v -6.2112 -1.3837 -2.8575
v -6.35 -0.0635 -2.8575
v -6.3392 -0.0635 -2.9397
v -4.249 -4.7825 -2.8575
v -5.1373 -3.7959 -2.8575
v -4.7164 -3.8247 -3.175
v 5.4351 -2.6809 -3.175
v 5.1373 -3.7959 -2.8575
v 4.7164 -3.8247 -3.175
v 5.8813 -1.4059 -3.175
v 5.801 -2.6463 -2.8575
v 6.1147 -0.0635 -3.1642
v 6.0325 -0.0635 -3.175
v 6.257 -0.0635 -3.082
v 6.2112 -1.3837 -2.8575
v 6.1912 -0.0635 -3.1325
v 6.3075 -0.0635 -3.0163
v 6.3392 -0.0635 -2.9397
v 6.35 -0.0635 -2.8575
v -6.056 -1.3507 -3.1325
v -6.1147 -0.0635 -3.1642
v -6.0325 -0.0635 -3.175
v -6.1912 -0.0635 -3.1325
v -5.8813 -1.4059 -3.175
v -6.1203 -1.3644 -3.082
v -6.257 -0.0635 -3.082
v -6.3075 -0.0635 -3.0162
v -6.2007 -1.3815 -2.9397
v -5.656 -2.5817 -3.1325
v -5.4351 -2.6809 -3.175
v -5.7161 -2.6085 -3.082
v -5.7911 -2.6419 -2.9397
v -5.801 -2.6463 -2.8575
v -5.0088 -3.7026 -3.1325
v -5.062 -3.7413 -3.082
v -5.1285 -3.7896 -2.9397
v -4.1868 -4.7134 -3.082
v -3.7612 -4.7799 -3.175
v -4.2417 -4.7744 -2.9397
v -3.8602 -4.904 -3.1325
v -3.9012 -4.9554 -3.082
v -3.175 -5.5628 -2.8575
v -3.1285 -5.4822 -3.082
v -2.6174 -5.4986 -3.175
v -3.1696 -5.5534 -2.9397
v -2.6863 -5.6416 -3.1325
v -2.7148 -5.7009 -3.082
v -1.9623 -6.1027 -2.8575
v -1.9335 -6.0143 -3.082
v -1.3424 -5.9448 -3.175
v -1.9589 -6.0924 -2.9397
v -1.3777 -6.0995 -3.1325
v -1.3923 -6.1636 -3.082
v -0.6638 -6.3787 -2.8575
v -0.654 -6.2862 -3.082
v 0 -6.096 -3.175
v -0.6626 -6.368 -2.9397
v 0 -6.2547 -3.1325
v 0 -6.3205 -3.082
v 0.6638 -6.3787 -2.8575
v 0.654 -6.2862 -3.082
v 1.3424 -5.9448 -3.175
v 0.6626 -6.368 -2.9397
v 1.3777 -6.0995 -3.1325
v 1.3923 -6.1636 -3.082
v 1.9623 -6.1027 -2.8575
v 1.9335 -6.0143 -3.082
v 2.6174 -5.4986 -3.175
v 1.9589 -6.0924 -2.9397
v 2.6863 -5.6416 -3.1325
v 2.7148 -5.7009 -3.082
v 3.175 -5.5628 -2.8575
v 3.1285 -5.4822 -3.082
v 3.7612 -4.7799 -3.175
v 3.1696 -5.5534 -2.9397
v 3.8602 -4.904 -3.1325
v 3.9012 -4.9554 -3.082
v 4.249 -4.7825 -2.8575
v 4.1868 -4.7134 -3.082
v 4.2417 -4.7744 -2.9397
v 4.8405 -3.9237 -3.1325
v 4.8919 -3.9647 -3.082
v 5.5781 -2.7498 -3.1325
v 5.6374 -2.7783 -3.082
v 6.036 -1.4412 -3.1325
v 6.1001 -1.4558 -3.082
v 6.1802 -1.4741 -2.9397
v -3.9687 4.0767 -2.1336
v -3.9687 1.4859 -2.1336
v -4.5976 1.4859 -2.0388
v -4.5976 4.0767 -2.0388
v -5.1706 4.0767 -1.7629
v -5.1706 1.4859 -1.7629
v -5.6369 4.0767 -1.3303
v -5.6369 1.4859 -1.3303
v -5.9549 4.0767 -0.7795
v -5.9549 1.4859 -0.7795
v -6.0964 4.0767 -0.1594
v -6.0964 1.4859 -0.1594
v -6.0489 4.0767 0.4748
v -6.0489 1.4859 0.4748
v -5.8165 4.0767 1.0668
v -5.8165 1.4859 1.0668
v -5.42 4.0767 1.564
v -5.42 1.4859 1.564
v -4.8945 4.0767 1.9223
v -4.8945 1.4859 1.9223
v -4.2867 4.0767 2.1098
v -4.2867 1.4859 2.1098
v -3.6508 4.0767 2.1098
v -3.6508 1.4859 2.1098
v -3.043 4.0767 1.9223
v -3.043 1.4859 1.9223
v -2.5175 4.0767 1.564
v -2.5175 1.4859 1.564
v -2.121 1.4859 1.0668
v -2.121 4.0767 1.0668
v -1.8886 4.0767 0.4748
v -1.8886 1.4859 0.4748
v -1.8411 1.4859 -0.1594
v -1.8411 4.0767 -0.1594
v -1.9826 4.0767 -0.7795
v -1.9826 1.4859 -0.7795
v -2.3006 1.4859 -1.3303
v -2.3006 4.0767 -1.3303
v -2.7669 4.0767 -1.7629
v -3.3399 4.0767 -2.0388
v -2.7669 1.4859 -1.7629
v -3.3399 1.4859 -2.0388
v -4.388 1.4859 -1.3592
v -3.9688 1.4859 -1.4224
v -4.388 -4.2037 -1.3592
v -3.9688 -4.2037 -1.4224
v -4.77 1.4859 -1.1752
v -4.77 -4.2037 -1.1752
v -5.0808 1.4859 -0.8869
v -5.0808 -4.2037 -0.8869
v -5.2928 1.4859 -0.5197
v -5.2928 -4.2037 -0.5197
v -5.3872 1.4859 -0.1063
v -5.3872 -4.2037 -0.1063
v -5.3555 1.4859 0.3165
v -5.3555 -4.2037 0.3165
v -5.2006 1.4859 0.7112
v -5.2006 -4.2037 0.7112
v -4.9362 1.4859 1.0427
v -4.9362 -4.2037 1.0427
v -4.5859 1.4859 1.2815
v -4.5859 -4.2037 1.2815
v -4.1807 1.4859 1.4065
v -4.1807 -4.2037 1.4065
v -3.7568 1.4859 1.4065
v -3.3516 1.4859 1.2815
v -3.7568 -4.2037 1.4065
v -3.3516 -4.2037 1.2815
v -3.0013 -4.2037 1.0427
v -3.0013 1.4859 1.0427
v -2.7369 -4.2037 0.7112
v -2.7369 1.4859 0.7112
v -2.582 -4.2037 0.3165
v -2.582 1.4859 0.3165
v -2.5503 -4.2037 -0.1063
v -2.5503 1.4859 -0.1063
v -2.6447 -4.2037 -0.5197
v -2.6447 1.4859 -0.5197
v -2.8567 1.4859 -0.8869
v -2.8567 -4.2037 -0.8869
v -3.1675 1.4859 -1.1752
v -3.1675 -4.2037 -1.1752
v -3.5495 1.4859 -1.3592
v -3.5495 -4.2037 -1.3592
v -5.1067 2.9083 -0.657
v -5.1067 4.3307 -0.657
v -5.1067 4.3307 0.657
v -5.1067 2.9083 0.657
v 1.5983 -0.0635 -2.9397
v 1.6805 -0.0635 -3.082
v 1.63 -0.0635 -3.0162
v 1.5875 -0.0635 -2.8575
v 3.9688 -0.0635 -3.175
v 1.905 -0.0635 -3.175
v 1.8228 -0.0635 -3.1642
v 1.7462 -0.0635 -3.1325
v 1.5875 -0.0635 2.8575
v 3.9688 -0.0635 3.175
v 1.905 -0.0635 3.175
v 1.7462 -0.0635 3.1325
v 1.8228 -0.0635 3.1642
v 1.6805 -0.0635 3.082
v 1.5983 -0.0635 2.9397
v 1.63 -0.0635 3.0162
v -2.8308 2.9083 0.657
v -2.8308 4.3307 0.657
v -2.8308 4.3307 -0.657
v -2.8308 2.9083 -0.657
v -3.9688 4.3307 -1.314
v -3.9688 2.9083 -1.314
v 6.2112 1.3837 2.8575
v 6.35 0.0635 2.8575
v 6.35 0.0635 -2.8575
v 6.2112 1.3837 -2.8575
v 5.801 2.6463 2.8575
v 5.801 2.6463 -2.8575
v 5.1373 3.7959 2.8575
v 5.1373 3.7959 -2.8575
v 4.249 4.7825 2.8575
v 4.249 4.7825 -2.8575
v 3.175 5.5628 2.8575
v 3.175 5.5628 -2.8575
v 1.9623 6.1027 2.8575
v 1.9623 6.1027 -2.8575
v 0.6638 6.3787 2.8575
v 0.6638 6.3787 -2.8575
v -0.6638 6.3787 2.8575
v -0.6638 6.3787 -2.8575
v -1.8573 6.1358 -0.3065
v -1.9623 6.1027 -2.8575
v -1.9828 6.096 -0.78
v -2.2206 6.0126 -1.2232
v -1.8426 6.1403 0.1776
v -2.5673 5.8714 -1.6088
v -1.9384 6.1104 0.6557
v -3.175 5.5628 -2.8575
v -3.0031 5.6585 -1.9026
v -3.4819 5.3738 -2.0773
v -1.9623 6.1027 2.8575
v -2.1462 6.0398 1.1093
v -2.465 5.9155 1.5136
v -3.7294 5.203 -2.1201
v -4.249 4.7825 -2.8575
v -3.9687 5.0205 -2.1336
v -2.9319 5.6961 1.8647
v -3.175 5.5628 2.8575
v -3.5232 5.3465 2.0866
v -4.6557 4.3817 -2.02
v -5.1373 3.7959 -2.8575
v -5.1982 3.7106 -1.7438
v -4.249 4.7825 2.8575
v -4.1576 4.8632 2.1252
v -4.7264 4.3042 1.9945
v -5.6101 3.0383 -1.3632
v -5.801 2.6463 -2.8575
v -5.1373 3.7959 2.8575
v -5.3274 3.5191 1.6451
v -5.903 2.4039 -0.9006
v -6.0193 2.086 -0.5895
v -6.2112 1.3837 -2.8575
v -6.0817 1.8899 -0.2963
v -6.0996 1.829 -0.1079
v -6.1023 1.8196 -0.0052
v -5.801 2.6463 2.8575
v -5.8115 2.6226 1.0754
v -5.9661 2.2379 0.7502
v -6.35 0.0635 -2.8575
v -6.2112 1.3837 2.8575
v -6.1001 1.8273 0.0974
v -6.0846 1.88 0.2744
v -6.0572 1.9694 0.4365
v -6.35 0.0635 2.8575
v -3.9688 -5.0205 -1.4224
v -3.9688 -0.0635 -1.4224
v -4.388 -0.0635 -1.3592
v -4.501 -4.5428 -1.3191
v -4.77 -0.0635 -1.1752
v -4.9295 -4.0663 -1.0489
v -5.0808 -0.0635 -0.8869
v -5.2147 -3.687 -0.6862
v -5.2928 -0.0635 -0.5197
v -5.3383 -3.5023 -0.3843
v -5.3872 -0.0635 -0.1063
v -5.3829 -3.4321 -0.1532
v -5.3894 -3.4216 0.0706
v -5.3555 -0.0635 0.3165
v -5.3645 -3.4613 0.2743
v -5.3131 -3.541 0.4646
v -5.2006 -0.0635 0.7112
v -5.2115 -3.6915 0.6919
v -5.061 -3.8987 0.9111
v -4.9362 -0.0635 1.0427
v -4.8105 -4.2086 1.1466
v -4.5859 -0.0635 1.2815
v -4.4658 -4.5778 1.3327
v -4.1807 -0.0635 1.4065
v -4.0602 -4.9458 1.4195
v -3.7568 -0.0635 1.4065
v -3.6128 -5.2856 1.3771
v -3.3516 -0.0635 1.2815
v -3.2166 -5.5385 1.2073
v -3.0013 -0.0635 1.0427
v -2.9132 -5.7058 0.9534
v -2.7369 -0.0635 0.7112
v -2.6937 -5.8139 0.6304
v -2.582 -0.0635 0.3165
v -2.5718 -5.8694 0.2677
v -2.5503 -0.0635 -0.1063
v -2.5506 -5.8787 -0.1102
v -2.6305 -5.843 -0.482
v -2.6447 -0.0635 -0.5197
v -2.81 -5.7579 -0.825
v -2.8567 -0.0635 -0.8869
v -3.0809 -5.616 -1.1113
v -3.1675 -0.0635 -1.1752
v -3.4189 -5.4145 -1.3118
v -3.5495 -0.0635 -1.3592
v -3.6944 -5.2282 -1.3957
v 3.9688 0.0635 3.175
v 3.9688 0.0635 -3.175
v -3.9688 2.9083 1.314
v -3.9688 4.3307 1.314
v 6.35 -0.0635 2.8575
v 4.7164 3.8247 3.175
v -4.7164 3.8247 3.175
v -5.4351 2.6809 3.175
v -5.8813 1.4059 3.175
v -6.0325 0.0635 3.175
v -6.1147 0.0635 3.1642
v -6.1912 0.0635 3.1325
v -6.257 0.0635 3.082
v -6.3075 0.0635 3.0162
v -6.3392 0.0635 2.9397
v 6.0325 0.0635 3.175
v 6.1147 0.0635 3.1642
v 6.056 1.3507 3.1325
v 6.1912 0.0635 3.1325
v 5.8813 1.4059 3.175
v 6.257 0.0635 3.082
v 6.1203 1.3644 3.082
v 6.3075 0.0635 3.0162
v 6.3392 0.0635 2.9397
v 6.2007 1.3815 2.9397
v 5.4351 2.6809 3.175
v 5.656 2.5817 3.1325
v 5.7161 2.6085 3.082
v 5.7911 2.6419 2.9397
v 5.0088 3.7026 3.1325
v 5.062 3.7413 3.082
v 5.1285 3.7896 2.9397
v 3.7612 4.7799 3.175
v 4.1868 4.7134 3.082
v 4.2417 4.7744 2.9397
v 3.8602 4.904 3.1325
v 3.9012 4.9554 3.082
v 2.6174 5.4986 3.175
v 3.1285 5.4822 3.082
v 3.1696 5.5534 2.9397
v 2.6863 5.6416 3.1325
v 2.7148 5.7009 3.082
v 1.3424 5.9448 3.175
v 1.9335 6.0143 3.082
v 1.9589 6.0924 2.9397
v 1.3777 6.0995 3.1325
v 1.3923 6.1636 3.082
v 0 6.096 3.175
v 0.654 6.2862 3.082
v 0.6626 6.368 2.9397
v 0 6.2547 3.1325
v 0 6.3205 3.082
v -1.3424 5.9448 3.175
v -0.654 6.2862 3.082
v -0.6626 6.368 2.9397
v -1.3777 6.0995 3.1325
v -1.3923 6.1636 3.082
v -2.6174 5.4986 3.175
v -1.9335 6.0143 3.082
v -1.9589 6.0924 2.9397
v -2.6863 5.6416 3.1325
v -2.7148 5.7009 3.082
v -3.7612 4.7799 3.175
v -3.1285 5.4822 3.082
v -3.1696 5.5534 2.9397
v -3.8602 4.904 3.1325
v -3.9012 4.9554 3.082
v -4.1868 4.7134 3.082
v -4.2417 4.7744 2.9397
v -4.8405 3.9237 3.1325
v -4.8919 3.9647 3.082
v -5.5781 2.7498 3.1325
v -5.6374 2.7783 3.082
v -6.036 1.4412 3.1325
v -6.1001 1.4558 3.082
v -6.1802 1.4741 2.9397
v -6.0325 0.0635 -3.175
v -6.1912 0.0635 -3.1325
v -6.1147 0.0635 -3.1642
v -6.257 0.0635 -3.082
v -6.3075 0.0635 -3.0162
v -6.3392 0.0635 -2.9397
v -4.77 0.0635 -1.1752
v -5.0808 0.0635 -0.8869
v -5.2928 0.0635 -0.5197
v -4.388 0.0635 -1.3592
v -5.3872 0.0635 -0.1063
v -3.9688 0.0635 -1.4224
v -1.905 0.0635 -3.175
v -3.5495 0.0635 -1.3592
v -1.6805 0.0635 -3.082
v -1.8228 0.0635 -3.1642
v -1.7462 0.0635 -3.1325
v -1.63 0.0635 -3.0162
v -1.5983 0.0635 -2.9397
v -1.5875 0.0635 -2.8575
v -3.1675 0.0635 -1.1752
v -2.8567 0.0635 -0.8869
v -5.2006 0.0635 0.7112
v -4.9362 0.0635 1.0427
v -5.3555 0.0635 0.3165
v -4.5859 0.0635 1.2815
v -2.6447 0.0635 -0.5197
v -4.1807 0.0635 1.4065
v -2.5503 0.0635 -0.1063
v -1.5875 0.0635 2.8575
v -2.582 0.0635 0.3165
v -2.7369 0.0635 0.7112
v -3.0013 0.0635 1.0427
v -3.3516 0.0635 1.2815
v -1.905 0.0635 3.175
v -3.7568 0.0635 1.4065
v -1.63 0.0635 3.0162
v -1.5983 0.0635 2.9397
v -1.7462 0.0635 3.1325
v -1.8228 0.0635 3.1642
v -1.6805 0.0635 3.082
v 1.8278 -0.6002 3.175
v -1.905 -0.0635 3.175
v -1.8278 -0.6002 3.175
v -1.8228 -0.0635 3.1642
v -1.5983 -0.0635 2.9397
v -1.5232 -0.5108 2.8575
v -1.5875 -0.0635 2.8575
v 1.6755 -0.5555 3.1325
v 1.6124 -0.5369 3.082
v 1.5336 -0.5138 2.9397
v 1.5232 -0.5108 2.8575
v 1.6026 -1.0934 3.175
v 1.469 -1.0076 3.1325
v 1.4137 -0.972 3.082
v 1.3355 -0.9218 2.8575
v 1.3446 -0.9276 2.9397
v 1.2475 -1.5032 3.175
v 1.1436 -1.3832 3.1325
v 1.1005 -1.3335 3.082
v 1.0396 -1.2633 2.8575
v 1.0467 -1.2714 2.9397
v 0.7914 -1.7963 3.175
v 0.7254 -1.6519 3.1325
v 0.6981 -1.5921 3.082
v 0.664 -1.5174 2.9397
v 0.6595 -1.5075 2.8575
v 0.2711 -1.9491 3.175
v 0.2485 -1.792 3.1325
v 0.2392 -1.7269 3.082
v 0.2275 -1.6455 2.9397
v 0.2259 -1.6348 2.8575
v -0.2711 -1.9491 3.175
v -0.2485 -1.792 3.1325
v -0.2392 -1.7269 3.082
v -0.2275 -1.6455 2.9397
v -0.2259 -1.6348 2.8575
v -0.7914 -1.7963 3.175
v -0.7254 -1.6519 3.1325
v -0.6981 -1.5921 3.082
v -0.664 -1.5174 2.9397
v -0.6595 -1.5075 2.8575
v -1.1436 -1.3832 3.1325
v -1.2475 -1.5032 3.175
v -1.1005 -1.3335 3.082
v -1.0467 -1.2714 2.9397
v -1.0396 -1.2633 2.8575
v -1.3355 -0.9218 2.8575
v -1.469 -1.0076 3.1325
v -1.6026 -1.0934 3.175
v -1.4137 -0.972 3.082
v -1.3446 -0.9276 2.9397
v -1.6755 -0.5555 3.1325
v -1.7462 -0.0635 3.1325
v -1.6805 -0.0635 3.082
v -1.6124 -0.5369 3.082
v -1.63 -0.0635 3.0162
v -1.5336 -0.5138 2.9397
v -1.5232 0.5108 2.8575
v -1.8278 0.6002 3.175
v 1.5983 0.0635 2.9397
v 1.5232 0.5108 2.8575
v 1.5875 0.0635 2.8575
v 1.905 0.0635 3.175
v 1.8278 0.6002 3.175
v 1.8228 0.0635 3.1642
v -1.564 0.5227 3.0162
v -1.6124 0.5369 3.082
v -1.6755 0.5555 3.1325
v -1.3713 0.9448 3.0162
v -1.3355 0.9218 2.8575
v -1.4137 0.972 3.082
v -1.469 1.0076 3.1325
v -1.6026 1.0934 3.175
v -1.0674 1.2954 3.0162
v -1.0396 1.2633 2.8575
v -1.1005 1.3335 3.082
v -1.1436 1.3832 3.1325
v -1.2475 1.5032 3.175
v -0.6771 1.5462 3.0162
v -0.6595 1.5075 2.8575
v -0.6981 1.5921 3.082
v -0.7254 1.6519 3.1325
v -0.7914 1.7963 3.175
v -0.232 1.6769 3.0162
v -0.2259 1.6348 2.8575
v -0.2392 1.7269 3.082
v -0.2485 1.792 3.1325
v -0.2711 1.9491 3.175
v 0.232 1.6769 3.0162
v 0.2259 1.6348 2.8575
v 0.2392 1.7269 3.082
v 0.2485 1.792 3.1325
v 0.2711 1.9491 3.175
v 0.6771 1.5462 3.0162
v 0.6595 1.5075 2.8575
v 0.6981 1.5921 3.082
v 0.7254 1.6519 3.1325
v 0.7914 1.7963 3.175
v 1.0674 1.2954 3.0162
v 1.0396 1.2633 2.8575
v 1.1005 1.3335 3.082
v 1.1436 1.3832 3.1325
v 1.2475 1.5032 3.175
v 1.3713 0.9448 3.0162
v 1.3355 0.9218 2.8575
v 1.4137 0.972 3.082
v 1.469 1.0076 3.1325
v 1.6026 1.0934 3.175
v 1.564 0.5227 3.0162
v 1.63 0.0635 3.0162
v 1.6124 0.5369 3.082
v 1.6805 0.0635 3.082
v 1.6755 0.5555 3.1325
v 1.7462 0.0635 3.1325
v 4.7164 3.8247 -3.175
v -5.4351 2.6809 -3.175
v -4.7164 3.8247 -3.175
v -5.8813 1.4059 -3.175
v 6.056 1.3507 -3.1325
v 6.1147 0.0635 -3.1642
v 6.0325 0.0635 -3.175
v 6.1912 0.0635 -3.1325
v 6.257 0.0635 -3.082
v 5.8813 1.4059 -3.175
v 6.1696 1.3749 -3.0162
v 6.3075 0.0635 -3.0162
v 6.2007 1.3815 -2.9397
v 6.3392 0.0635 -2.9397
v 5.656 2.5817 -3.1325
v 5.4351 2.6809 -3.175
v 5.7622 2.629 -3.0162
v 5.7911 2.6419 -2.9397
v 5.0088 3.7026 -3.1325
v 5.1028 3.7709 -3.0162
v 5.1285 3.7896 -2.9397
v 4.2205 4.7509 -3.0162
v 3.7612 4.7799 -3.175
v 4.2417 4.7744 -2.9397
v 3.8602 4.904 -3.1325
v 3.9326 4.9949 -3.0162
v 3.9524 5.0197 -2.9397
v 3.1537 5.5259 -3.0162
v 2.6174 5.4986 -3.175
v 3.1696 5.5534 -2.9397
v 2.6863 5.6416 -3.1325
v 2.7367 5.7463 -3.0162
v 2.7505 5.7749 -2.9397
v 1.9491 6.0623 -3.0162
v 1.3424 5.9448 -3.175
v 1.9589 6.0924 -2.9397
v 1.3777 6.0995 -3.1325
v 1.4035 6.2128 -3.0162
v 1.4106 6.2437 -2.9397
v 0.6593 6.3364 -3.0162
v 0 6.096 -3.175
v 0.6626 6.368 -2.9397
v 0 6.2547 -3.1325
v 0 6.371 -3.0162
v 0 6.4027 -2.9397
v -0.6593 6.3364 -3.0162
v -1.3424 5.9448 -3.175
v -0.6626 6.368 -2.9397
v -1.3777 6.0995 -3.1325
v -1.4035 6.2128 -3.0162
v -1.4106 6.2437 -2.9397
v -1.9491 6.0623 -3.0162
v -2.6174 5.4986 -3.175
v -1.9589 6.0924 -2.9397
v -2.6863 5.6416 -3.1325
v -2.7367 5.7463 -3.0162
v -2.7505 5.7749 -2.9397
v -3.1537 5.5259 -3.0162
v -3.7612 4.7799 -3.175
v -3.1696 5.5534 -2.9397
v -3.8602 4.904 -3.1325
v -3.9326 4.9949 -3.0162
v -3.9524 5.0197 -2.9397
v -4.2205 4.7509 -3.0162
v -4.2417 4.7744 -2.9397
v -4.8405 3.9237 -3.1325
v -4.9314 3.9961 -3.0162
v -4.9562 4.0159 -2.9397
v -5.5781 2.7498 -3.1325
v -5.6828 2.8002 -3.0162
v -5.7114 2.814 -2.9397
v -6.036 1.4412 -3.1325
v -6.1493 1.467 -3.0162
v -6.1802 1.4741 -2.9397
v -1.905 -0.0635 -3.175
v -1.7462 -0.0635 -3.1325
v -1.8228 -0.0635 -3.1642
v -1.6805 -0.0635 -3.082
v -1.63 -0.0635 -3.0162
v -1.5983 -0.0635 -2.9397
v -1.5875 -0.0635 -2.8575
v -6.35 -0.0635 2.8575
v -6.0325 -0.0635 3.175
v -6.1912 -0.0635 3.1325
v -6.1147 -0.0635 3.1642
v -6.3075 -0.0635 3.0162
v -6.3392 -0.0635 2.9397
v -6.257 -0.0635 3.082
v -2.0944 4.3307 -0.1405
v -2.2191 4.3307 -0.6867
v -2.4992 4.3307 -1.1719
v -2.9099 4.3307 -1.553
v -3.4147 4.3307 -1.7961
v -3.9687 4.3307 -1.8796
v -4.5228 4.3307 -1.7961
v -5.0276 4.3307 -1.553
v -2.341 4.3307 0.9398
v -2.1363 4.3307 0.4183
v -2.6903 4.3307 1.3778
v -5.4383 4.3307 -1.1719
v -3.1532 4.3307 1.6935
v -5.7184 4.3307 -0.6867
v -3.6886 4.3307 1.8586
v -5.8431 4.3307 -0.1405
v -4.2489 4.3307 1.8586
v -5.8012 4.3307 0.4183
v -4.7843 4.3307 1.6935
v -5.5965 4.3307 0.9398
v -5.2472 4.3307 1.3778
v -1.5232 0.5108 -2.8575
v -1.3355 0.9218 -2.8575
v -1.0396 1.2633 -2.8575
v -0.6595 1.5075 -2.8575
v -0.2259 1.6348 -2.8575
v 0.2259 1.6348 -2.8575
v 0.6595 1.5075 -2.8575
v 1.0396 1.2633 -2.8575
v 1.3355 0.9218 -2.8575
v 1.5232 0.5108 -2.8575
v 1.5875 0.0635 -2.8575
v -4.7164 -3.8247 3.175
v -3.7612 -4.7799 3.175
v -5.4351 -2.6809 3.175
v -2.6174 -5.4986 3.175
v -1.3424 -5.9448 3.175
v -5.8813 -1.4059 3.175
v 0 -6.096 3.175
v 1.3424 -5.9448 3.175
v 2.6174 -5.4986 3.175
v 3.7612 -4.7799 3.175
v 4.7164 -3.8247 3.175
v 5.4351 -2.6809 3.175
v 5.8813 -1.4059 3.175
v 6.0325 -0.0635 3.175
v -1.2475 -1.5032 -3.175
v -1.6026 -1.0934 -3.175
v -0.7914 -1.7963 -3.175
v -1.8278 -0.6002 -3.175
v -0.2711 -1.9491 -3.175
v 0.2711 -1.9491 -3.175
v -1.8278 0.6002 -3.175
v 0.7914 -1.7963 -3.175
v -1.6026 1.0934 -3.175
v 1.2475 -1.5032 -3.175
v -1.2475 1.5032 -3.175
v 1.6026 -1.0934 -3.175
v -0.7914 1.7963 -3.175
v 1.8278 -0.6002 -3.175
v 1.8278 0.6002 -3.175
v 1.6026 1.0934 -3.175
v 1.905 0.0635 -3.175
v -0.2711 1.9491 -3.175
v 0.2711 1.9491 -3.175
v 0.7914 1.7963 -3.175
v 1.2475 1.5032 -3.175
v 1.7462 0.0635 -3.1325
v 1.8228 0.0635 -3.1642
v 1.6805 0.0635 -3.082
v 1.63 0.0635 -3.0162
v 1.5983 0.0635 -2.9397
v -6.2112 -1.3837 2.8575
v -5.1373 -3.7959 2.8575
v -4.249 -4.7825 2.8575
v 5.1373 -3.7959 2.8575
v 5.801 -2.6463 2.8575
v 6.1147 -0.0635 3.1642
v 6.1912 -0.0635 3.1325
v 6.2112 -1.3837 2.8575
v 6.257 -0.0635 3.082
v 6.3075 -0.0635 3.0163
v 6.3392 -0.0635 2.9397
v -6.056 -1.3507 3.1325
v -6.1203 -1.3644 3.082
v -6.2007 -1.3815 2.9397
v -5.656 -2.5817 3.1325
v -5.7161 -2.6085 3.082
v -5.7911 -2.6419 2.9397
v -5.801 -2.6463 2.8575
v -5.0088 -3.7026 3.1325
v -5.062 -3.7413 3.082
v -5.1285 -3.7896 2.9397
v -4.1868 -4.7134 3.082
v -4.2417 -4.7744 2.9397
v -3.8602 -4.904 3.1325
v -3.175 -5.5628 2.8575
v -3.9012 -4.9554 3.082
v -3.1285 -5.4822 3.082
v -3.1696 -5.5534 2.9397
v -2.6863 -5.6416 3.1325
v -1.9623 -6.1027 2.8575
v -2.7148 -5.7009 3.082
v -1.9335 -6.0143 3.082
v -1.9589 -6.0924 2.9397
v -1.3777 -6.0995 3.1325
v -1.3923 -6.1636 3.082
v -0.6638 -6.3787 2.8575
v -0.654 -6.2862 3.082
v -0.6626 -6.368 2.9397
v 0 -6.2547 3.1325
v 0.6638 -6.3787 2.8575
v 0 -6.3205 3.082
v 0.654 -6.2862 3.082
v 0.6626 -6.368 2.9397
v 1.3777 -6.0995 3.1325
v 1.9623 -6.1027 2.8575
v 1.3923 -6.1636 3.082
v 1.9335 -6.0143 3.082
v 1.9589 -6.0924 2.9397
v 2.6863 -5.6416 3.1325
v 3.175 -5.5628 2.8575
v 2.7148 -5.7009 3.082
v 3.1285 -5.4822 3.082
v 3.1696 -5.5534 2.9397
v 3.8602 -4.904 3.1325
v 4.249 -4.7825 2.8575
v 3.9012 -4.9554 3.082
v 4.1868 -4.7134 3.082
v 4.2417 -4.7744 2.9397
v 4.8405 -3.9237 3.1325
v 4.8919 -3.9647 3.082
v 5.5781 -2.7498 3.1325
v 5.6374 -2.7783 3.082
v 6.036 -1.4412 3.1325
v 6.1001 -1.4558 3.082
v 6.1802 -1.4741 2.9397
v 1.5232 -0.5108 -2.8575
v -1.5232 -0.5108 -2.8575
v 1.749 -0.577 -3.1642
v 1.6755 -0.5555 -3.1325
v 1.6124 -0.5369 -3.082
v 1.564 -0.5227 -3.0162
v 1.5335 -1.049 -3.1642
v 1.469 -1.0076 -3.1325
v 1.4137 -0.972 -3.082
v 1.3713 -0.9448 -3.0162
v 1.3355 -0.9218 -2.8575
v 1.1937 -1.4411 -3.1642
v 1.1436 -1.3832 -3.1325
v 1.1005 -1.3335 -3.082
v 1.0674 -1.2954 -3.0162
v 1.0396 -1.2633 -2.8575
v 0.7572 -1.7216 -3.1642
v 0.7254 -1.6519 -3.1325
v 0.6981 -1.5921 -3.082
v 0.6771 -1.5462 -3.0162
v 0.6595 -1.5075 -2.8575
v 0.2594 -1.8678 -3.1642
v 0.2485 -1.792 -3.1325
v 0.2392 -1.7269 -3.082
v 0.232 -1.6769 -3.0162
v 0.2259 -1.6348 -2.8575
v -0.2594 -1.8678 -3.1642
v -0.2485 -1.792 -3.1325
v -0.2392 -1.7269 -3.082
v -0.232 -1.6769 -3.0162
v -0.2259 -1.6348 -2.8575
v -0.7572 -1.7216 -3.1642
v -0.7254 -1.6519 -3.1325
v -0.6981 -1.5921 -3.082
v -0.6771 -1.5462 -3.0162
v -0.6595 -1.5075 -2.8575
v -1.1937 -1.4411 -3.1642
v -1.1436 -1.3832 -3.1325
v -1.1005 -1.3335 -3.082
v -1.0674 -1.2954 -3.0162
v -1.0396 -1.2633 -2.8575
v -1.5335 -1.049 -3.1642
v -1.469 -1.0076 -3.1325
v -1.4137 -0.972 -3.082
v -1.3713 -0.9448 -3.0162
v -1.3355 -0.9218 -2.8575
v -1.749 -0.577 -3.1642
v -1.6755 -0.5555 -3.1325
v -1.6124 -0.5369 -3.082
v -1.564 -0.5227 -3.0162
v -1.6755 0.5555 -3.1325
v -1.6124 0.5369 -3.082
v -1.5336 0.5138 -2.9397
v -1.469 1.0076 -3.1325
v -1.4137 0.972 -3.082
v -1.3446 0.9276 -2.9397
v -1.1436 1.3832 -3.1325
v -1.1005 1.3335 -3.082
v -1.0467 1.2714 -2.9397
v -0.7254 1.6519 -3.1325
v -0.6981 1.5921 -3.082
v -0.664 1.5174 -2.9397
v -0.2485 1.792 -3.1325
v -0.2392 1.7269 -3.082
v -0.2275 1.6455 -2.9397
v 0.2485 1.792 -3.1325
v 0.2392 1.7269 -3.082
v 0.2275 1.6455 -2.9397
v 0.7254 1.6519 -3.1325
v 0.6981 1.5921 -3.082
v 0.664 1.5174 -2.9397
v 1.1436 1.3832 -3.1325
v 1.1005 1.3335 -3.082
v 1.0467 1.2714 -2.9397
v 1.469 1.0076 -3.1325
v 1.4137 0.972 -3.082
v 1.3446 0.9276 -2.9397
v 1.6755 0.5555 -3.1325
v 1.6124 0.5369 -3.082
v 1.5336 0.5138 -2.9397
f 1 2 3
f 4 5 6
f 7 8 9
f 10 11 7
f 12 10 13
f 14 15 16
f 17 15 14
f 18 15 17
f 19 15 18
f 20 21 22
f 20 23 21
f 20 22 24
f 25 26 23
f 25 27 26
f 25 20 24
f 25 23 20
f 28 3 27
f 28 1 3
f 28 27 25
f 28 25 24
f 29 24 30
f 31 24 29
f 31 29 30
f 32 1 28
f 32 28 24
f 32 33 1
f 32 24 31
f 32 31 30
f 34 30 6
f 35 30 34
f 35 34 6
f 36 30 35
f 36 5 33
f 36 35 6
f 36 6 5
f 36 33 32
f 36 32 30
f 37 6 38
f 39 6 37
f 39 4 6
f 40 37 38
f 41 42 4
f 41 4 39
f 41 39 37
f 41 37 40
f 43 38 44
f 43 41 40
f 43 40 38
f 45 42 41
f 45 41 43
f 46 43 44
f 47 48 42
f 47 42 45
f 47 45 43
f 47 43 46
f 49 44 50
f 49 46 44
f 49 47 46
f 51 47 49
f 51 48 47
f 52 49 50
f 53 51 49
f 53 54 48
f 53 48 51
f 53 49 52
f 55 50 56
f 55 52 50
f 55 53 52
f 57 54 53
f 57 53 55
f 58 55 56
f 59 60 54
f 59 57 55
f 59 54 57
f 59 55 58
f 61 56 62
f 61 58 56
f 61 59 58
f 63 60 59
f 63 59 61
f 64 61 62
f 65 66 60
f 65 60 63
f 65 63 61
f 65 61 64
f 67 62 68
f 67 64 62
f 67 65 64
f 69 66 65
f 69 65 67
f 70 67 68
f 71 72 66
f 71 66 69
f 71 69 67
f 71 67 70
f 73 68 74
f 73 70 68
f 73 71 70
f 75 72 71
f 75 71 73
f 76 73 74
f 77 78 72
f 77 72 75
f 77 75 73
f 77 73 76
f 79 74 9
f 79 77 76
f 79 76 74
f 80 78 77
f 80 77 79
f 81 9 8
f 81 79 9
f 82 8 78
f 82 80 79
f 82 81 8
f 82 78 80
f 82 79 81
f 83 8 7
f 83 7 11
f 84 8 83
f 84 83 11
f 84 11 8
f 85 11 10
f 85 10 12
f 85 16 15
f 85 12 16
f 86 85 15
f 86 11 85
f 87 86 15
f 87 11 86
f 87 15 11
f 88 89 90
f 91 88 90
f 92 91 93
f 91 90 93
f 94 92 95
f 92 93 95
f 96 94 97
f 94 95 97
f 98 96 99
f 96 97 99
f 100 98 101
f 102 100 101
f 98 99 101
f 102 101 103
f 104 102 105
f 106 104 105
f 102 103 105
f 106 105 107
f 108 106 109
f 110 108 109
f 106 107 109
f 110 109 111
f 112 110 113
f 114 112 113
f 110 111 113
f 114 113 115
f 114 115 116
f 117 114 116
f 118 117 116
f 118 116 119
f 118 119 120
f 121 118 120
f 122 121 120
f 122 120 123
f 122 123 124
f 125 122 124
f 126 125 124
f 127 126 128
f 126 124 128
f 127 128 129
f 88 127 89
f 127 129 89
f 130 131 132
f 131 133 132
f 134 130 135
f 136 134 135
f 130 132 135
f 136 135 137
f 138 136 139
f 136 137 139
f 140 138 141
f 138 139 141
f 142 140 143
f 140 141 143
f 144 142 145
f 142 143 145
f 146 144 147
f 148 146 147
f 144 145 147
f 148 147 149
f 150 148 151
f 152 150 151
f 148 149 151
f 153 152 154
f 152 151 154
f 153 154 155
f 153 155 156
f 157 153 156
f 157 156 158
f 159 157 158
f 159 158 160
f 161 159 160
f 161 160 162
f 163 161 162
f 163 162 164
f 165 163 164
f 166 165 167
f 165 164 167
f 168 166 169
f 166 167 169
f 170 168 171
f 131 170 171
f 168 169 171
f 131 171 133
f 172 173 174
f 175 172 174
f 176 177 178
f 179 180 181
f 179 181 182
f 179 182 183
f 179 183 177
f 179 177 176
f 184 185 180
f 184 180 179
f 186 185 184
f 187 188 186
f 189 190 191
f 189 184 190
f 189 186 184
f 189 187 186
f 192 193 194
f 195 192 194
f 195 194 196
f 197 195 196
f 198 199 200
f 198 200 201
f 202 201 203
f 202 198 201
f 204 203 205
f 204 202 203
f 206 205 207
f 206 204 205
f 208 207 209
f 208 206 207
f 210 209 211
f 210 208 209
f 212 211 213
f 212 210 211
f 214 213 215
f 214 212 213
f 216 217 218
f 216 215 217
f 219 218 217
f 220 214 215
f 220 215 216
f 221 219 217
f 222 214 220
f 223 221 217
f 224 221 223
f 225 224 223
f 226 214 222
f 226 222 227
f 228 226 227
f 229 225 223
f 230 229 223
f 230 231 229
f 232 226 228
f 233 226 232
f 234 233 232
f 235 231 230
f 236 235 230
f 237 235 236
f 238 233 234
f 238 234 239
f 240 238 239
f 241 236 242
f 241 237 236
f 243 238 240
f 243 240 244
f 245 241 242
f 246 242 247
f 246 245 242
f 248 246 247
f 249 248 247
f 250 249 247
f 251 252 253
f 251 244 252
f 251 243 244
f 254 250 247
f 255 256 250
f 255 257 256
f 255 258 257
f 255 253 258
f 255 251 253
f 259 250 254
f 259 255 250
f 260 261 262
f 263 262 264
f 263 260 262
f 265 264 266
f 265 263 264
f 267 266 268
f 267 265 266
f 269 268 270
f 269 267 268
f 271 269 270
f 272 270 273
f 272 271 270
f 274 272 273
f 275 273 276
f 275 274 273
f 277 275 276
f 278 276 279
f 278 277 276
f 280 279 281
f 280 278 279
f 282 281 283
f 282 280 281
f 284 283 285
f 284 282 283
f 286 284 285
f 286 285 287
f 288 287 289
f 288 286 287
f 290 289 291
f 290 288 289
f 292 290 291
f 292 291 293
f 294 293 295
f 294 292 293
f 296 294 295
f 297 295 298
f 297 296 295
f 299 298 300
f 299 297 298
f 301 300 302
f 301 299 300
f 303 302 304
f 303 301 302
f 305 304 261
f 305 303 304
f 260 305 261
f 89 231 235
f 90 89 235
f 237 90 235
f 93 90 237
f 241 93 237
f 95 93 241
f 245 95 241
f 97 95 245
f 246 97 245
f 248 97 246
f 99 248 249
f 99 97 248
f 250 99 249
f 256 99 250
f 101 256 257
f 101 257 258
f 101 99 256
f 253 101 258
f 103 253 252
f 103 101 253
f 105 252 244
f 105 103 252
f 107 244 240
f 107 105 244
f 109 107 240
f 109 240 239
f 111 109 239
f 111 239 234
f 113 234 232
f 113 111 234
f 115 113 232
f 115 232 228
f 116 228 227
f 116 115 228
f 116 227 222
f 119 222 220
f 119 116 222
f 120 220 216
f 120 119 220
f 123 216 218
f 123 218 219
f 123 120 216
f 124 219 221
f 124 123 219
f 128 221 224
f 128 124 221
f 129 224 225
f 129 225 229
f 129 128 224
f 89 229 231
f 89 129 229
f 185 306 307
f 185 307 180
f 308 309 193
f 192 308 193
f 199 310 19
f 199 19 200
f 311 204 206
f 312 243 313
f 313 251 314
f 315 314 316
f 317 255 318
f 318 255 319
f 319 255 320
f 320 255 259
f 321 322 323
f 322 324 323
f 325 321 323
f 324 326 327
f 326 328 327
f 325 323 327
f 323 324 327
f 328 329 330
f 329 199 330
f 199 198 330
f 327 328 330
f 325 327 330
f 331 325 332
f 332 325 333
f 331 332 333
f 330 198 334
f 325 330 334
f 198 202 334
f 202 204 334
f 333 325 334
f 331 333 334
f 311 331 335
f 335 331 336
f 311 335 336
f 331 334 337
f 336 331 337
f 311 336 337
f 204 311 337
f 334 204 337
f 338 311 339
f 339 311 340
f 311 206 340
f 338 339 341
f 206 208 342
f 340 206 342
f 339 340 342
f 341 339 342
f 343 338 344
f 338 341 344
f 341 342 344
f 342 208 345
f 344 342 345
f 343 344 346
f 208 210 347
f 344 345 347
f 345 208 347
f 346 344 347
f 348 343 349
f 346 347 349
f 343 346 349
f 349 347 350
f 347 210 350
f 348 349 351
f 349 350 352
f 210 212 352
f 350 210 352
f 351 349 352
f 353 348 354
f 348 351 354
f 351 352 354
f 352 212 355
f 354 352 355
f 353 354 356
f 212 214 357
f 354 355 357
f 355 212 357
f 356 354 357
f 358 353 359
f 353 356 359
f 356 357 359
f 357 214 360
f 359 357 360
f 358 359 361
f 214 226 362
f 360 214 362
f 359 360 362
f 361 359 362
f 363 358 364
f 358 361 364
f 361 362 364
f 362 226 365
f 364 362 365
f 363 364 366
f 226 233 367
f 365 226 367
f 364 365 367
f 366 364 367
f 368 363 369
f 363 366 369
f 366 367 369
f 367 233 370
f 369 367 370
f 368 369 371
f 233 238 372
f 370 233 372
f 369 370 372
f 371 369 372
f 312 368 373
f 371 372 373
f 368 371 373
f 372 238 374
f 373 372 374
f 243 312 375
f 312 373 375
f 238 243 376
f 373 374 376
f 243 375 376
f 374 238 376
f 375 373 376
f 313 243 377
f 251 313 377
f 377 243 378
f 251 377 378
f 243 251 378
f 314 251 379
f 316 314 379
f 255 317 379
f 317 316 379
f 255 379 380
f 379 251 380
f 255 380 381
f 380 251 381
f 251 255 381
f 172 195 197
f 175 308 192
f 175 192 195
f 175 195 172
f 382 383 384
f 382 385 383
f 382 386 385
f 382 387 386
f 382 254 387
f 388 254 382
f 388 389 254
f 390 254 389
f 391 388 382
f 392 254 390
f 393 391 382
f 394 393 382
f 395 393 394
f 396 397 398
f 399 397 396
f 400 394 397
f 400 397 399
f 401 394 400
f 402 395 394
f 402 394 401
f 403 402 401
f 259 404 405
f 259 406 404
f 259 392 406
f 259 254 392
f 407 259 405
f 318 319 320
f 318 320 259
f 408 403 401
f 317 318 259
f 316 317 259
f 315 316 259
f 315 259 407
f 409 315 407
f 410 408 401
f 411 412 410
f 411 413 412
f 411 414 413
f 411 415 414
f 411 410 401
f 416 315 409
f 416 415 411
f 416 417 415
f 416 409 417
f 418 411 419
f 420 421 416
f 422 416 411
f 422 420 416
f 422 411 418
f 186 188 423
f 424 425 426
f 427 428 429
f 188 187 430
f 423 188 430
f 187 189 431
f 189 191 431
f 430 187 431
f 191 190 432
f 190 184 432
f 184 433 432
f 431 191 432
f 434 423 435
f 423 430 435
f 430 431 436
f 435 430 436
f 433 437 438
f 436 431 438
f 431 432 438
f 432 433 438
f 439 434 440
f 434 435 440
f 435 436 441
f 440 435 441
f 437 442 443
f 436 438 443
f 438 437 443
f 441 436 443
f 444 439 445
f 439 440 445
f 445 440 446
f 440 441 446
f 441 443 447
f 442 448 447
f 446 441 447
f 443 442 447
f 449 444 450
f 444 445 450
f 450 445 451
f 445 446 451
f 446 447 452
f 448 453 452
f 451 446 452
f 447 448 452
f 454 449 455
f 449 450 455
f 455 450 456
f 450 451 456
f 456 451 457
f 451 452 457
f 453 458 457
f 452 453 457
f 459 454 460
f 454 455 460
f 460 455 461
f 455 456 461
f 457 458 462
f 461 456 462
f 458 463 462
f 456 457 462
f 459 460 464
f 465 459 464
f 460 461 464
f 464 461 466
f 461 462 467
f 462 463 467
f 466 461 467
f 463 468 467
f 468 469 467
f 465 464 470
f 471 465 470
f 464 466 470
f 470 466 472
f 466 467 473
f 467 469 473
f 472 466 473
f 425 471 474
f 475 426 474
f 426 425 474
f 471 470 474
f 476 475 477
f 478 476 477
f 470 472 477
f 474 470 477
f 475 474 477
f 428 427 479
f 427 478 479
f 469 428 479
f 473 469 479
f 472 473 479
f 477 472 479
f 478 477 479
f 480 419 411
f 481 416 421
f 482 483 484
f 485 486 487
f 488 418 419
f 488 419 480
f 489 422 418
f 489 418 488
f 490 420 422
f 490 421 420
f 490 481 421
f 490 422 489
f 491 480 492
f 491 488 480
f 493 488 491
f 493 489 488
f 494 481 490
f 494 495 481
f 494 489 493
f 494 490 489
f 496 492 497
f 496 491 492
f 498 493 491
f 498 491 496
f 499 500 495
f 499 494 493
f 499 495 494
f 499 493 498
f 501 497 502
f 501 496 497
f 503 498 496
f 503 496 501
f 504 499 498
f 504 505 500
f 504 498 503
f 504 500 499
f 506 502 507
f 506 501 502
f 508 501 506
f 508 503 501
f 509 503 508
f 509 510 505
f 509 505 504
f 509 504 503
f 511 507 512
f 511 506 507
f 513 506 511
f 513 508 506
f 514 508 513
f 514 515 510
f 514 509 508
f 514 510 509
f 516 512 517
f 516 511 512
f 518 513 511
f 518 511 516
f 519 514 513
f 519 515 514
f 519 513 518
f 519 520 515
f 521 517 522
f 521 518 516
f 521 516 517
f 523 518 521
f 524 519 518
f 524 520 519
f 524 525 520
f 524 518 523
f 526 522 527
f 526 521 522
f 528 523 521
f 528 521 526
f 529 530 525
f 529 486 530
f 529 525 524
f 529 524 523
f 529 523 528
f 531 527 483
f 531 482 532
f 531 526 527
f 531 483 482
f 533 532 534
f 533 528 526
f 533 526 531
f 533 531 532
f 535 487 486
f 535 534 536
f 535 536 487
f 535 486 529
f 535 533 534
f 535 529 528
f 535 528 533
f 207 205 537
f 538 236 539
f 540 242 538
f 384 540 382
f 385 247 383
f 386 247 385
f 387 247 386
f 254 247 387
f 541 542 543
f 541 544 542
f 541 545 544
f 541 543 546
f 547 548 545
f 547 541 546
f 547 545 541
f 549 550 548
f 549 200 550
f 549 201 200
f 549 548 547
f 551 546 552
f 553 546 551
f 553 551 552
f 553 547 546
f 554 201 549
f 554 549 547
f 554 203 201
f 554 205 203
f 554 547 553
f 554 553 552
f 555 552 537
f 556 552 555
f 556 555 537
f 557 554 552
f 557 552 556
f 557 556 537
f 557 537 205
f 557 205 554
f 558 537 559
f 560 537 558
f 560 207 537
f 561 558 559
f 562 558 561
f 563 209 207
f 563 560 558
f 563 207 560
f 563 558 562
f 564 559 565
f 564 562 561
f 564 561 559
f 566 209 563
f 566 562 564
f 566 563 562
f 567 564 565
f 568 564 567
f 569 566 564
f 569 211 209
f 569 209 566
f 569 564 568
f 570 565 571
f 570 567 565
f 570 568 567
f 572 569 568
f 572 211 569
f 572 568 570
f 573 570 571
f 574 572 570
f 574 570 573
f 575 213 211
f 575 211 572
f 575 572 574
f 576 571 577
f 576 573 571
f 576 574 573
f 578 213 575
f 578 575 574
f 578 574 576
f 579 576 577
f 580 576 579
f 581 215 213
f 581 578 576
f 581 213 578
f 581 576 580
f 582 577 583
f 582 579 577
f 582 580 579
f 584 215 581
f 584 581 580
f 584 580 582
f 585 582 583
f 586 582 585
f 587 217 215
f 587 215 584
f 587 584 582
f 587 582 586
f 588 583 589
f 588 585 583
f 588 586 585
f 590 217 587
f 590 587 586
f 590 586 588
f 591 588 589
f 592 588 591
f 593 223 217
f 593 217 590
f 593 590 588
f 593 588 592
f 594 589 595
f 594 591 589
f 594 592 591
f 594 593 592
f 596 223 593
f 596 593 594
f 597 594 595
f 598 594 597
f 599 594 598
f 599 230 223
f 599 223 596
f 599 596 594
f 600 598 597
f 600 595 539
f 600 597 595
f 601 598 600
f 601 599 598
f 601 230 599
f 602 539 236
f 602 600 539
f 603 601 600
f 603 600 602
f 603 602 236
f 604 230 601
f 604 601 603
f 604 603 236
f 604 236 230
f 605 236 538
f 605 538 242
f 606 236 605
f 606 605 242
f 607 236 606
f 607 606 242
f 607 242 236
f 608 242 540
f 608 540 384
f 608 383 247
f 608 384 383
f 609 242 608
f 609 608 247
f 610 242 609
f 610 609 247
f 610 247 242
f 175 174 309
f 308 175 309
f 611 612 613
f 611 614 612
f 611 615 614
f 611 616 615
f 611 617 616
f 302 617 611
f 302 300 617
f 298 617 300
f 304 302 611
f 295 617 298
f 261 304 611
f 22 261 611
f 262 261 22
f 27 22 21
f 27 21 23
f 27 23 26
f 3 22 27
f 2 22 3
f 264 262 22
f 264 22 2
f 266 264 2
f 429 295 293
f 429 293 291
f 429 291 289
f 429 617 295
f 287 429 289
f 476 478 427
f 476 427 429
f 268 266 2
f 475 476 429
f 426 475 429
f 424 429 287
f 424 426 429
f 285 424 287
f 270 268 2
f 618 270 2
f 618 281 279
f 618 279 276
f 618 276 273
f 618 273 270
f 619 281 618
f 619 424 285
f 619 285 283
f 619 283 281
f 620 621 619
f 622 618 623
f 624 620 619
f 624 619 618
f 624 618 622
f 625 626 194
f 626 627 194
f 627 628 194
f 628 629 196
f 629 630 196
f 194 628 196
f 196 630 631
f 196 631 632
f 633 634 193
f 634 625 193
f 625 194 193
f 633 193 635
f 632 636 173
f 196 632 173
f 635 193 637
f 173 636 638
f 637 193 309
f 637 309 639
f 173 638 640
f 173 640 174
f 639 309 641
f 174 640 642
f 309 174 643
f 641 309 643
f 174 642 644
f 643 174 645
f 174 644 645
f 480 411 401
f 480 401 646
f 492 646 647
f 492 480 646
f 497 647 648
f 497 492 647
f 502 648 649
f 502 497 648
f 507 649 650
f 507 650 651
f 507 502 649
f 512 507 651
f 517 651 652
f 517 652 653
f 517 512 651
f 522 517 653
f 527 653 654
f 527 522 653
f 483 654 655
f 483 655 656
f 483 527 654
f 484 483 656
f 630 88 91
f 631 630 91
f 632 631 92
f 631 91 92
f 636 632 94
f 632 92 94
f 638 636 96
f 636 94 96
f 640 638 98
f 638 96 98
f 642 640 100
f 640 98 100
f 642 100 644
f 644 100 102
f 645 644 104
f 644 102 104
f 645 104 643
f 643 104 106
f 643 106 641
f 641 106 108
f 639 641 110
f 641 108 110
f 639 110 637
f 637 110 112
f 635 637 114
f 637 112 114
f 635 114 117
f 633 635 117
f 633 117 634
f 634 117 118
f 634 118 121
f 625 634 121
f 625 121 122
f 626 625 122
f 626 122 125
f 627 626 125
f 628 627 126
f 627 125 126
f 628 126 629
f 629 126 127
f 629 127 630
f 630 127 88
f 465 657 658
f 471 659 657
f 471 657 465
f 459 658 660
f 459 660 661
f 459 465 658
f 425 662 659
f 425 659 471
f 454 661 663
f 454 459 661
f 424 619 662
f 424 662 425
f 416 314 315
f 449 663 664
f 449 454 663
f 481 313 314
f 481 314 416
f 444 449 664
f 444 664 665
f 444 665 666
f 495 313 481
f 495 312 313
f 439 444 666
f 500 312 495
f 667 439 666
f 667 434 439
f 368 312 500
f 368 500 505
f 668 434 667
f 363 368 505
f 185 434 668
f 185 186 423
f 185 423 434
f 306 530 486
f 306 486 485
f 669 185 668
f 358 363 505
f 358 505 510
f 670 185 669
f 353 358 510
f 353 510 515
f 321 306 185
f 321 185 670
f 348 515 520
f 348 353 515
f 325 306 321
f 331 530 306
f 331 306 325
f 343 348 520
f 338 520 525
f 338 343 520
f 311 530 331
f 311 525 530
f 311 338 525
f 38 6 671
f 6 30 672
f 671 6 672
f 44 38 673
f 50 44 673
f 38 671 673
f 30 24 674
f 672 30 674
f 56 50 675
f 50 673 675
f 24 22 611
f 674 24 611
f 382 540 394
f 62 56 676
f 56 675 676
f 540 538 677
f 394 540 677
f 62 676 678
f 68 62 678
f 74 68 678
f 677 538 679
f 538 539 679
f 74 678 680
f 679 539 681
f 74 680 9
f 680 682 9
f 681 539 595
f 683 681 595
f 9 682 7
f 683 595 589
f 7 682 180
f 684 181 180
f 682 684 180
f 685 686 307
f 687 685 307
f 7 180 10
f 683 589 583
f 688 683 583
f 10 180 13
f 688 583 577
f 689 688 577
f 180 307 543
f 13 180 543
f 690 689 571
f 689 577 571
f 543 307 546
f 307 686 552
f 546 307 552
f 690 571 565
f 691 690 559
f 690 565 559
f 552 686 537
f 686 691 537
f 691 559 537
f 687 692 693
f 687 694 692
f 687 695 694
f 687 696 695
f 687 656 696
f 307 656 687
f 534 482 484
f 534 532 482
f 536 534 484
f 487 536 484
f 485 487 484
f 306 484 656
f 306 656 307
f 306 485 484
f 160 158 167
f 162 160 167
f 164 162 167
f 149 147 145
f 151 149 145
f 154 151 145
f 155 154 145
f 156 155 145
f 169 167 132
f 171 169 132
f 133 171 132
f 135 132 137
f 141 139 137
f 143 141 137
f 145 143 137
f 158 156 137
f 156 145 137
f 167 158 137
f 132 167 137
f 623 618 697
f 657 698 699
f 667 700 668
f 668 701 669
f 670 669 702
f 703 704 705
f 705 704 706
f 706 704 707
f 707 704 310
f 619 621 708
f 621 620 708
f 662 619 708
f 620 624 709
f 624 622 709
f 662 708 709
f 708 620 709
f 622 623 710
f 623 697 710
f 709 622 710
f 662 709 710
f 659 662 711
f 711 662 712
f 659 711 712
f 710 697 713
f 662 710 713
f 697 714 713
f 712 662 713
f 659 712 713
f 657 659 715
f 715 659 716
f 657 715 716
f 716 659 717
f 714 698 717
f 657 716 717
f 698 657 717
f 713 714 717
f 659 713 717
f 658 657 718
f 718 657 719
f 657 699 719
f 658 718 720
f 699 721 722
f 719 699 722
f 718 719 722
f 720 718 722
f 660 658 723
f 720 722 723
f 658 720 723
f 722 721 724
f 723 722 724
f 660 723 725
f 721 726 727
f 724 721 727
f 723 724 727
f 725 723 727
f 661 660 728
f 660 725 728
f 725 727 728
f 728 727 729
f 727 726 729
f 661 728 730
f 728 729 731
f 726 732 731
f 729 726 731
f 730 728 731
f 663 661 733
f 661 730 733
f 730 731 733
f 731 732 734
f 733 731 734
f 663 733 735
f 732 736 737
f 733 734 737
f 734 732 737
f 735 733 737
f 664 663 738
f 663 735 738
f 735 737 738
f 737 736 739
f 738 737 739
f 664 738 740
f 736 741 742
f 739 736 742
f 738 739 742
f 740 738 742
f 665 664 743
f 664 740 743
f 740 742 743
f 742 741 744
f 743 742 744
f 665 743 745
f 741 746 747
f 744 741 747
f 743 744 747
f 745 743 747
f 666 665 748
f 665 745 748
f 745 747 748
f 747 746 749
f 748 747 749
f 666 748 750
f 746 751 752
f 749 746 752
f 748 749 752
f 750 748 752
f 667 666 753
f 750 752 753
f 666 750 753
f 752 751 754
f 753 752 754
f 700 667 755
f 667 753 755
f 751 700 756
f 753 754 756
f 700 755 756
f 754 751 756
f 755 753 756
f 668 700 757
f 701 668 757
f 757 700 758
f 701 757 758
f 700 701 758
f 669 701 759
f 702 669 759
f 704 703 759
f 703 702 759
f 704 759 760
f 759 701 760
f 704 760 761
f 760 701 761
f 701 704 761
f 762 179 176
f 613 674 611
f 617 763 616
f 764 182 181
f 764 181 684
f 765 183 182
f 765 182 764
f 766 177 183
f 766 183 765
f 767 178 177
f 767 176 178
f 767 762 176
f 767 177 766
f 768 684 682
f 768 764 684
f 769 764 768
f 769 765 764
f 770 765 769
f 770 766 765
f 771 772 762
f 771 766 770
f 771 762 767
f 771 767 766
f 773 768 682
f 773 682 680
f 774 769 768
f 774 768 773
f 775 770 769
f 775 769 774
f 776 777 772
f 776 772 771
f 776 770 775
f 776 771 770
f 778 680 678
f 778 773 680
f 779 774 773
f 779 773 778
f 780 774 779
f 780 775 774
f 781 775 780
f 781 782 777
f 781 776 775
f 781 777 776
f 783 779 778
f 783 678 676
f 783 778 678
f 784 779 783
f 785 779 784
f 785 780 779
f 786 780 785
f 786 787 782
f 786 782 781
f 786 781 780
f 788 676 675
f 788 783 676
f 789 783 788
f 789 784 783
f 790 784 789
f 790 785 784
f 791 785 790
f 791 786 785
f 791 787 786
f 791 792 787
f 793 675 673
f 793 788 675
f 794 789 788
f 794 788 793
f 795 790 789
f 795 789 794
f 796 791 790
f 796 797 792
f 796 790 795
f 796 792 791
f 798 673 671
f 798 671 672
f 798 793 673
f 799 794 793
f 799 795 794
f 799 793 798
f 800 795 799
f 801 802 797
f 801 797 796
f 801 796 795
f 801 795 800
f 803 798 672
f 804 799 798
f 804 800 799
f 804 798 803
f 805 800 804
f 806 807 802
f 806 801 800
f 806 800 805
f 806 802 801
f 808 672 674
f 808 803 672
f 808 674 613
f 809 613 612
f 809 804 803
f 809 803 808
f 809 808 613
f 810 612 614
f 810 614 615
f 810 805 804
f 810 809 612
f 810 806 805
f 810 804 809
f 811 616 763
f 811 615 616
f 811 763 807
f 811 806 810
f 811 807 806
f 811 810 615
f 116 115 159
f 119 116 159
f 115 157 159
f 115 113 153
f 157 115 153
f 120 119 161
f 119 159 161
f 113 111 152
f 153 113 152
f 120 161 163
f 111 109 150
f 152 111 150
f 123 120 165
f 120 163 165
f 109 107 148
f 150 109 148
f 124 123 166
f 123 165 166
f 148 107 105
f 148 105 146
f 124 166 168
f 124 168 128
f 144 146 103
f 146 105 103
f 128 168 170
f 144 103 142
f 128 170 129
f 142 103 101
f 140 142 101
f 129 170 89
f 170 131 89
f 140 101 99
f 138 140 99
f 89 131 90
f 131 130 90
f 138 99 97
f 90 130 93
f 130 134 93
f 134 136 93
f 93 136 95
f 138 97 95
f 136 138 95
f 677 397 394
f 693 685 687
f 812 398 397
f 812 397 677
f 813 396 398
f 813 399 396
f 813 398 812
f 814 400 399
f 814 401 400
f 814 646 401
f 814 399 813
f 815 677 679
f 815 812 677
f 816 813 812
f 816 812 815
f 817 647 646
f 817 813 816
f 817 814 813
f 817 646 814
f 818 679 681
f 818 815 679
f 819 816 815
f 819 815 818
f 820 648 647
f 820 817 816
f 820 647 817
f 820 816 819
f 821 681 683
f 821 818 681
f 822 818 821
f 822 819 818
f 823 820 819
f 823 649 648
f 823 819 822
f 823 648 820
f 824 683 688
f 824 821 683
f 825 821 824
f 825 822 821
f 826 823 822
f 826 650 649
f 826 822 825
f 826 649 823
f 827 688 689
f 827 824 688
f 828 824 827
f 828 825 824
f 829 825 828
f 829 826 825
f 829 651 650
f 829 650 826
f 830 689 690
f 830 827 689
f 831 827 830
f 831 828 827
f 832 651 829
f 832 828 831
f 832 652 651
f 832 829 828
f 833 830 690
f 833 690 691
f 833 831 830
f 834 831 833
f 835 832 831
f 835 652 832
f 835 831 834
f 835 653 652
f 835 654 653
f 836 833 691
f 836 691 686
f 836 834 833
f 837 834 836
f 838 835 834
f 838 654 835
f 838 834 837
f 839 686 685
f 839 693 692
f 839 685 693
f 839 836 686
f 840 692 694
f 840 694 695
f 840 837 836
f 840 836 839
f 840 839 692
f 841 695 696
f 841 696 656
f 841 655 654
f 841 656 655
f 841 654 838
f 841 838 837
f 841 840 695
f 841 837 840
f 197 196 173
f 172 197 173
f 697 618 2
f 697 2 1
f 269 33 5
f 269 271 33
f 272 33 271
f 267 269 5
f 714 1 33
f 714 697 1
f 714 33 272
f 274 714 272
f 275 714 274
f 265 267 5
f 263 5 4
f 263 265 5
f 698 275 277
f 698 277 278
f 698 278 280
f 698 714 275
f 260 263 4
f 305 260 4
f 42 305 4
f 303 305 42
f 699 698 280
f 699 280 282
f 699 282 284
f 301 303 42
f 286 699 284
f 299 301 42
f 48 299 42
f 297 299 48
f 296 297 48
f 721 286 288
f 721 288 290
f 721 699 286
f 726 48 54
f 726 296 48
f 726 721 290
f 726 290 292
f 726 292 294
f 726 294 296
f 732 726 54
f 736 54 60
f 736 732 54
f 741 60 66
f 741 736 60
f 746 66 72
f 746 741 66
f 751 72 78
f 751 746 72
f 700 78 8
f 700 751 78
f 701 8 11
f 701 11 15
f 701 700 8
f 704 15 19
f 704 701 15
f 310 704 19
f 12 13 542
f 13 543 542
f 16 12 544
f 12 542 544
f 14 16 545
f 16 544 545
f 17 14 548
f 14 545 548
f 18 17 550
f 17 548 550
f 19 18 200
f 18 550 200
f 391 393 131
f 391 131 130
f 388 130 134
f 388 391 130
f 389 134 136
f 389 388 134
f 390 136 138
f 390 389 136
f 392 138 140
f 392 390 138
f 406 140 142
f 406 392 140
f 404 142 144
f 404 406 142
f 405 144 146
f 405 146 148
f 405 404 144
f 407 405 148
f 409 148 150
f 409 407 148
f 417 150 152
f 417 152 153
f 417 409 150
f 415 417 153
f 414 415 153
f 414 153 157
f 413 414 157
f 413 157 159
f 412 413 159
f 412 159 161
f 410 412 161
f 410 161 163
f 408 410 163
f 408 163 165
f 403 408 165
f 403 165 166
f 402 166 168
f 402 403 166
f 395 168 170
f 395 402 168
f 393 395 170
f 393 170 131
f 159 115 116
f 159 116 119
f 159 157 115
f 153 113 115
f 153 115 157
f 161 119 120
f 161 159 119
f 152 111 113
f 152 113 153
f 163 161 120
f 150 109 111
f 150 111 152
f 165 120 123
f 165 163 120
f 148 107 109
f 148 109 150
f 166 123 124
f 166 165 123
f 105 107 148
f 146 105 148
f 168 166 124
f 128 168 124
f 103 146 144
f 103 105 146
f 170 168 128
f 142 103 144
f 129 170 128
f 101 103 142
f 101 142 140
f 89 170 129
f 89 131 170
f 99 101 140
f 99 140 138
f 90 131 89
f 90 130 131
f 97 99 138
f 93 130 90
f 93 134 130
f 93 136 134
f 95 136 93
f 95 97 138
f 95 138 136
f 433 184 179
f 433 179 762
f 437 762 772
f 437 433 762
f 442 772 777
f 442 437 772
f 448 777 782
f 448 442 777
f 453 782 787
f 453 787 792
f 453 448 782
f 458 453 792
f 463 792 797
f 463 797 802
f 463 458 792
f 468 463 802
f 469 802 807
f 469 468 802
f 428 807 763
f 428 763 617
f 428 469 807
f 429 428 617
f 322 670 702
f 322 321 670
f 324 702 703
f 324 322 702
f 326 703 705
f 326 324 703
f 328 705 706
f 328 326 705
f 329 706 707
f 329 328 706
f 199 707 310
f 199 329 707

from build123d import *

# Parameters (mm, degrees)
EXTRUDE1_DEPTH     = 3.175
CUT_EXTRUDE2_DEPTH = 1.4224
FILLET1_R          = 0.3175
FILLET2_R          = 0.3175
CHAMFER2_SIZE      = 0.254


with BuildPart() as part:
    # Sketch1 → Extrude1 (new, symmetric)
    with BuildSketch(Plane.XY):
        with BuildLine():
            Line((-6.35, 0.0635), (-1.5875, 0.0635))
            ThreePointArc((-1.5875, 0.0635), (0, 1.651), (1.5875, 0.0635))
            Line((1.5875, 0.0635), (3.96875, 0.0635))
            Line((3.96875, 0.0635), (3.96875, -0.0635))
            Line((3.96875, -0.0635), (1.5875, -0.0635))
            ThreePointArc((1.5875, -0.0635), (0, -1.651), (-1.5875, -0.0635))
            Line((-1.5875, -0.0635), (-6.35, -0.0635))
            ThreePointArc((-6.35, -0.0635), (0, -6.4135), (6.35, -0.0635))
            Line((6.35, -0.0635), (6.35, 0.0635))
            ThreePointArc((6.35, 0.0635), (0, 6.4135), (-6.35, 0.0635))
        make_face()
    extrude(amount=EXTRUDE1_DEPTH, both=True)

    # Sketch4 → Cut-Revolve1 (revolve, cut)
    with BuildSketch(Plane.XY):
        Polygon((-3.96875, 6.4135), (-1.83515, 6.4135), (-1.83515, 1.4859), (-2.54635, 1.4859), (-2.54635, -6.4135), (-3.96875, -6.4135), align=None)
    revolve(axis=Axis((-3.96875, -6.4135, 0), (0, 1, 0)), mode=Mode.SUBTRACT)

    # Fillet1
    fillet1_edges = [part.edges().sort_by_distance(p)[0] for p in [
        (0, 1.651, -3.175),
        (0, 1.651, 3.175),
        (0, 6.4135, -3.175),
        (0, 6.4135, 3.175),
        (0, -6.4135, -3.175),
        (0, -6.4135, 3.175),
        (6.35, 0, -3.175),
        (6.35, 0, 3.175),
    ]]
    fillet(fillet1_edges, radius=FILLET1_R)

    # Fillet2
    fillet2_edges = [part.edges().sort_by_distance(p)[0] for p in [
        (0, -1.651, -3.175),
        (0, -1.651, 3.175),
    ]]
    fillet(fillet2_edges, radius=FILLET2_R)


with BuildPart() as body_2:
    # Sketch6 → Revolve1 (revolve)
    with BuildSketch(Plane.XY):
        Polygon((-3.96875, 4.3307), (-1.83515, 4.3307), (-1.83515, 1.4859), (-2.54635, 1.4859), (-2.54635, -4.2037), (-3.96875, -4.2037), align=None)
    revolve(axis=Axis((-3.96875, -4.2037, 0), (0, 1, 0)))

    # Sketch7 → Cut-Extrude2 (cut)
    with BuildSketch(Plane(origin=(0, 4.3307, 0), x_dir=(-1, 0, 0), z_dir=(0, 1, 0))):
        Polygon((3.96875, -1.313956837), (5.10667, -0.656978418), (5.10667, 0.656978418), (3.96875, 1.313956837), (2.83083, 0.656978418), (2.83083, -0.656978418), align=None)
    extrude(amount=-CUT_EXTRUDE2_DEPTH, mode=Mode.SUBTRACT)

    # Chamfer2
    chamfer2_edges = [body_2.edges().sort_by_distance(p)[0] for p in [
        (-6.10235, 4.3307, 0),
    ]]
    chamfer(chamfer2_edges, length=CHAMFER2_SIZE)


solid = Compound([part.part, body_2.part])
